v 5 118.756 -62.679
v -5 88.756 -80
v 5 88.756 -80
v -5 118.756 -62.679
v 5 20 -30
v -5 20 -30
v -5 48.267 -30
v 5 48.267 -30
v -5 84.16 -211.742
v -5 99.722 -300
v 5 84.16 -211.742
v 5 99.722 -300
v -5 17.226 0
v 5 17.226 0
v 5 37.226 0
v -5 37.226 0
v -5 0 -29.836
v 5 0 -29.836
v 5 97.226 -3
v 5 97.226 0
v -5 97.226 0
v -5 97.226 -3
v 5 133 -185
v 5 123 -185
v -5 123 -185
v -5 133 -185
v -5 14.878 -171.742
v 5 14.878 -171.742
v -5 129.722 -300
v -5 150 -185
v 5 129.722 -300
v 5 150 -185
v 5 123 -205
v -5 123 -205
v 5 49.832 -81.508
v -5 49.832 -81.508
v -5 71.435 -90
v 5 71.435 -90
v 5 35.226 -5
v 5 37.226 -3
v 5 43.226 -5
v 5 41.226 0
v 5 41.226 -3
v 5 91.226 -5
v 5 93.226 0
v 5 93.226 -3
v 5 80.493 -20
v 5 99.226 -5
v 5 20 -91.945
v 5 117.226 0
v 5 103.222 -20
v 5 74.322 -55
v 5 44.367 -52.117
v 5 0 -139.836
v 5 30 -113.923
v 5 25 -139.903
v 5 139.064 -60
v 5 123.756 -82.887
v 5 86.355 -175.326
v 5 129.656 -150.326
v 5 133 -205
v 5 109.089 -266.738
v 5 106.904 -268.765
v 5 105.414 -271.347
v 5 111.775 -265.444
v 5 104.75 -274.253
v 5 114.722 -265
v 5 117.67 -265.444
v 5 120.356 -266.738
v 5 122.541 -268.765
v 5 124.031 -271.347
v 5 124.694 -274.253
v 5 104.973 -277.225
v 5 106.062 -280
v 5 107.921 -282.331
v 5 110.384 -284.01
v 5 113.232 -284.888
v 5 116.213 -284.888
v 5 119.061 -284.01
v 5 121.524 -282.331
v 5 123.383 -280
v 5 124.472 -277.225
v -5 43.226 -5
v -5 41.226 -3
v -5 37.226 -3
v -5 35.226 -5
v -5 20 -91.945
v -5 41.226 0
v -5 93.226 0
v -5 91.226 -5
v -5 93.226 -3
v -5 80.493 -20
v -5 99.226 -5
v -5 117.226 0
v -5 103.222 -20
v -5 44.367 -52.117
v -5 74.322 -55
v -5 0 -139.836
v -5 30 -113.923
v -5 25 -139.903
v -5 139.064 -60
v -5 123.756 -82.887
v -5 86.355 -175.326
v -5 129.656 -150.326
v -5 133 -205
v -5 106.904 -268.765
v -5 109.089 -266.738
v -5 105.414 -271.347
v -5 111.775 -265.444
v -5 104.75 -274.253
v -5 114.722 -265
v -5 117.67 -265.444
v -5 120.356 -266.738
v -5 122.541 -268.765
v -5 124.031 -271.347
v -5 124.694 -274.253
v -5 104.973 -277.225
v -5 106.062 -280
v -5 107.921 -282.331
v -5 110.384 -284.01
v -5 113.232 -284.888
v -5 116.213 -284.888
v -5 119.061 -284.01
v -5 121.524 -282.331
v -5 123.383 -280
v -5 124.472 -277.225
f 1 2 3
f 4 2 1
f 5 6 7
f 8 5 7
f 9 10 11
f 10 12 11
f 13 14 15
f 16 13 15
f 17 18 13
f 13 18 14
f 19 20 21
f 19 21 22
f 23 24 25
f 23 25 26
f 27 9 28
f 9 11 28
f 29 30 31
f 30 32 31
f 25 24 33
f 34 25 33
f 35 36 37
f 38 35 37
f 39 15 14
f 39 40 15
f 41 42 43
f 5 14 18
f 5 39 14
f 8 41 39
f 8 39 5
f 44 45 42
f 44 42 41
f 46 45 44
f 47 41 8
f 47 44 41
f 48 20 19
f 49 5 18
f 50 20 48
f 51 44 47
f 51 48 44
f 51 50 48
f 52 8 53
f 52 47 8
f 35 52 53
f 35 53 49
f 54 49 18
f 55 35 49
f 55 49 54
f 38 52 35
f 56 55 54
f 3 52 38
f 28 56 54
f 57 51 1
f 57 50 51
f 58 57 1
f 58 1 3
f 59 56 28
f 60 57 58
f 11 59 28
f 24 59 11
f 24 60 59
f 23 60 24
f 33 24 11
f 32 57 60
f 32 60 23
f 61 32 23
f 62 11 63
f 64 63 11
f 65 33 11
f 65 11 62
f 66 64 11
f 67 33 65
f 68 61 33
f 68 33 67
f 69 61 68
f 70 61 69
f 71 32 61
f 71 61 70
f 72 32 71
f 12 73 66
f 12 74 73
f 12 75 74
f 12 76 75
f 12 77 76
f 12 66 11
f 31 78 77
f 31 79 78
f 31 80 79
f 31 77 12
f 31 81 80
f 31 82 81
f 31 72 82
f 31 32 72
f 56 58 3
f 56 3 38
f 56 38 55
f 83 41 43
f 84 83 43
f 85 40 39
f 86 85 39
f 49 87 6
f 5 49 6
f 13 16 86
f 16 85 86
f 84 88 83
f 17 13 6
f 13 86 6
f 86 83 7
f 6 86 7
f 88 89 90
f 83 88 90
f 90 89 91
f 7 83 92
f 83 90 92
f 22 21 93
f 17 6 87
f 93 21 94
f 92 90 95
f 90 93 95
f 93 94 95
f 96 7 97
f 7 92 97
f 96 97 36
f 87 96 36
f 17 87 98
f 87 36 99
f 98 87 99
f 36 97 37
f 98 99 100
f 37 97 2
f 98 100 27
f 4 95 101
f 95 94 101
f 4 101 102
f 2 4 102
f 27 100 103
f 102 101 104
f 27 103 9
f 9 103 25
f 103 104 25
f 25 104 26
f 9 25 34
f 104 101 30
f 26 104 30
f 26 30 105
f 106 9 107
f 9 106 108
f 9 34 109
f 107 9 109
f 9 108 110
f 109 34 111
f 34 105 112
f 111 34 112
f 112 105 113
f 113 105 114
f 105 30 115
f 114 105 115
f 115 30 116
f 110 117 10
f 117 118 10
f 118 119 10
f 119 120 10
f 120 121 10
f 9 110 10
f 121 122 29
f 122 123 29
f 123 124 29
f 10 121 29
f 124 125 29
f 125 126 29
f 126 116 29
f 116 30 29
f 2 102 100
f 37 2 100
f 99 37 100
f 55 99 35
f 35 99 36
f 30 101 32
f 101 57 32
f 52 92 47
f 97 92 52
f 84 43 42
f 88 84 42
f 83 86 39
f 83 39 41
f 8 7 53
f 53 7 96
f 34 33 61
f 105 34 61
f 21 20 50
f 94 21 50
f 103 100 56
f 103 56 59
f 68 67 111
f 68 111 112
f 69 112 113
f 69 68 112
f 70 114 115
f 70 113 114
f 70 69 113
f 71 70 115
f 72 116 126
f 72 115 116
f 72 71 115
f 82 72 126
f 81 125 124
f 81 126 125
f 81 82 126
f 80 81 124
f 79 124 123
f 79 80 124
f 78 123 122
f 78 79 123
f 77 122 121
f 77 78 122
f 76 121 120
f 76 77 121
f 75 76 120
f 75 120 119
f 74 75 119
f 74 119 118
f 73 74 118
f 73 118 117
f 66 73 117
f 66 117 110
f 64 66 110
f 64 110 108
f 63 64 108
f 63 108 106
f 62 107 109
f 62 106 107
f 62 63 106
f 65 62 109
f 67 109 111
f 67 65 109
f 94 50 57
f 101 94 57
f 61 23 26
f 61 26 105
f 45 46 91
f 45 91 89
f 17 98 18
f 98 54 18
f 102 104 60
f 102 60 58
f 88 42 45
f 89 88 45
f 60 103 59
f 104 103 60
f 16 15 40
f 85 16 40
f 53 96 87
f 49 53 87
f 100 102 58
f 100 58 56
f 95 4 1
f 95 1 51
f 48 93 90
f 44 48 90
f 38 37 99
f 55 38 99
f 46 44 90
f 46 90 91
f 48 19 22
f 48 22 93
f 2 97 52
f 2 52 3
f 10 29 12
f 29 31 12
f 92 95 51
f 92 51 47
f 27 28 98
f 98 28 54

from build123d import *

# Parameters (mm, degrees)
ESQUISSE1_W                  = 300
ESQUISSE1_H                  = 150
BOSS_EXTRU_1_DEPTH           = 5
ESQUISSE2_OUTSIDE_W          = 369.112
ESQUISSE2_OUTSIDE_H          = 219.112
ENL_V_MAT_EXTRU_1_DEPTH      = 5
ENL_V_MAT_EXTRU_2_DEPTH      = 336.559234711
ENL_V_MAT_EXTRU_2_DEPTH_BACK = 336.559234711
ENL_V_MAT_EXTRU_3_DEPTH      = 336.559234711
ENL_V_MAT_EXTRU_3_DEPTH_BACK = 336.559234711
ENL_V_MAT_EXTRU_4_DEPTH      = 336.559234711
ENL_V_MAT_EXTRU_4_DEPTH_BACK = 336.559234711
ESQUISSE5_R                  = 10
ESQUISSE6_W                  = 20
ESQUISSE6_H                  = 10
ENL_V_MAT_EXTRU_5_DEPTH      = 49


with BuildPart() as part:
    # Esquisse1 → Boss.-Extru.1 (new, symmetric)
    with BuildSketch(Plane(origin=(0, 0, 0), x_dir=(0, 0, -1), z_dir=(1, 0, 0))):
        with Locations((150, 75)):
            Rectangle(ESQUISSE1_W, ESQUISSE1_H)
    extrude(amount=BOSS_EXTRU_1_DEPTH, both=True)

    # Esquisse2 outside → Enlèv. mat.-Extru.1 (cut, symmetric)
    with BuildSketch(Plane(origin=(0, 0, 0), x_dir=(0, 0, -1), z_dir=(1, 0, 0))):
        with Locations((150, 75)):
            Rectangle(ESQUISSE2_OUTSIDE_W, ESQUISSE2_OUTSIDE_H)
        Polygon((0, 117.225703003), (60, 139.063917059), (185, 150), (300, 129.722397219), (300, 99.722397219), (211.741963761, 84.160124165), (171.741963761, 14.878091862), (139.835792798, 0), (29.835792798, 0), (0, 17.225703003), align=None, mode=Mode.SUBTRACT)
    extrude(amount=ENL_V_MAT_EXTRU_1_DEPTH, both=True, mode=Mode.SUBTRACT)

    # Esquisse3 → Enlèv. mat.-Extru.2 (cut, two sides: drawn at the far end of the back side and taken through both)
    with BuildSketch(Plane(origin=(5, 0, 0), x_dir=(0, 0, -1), z_dir=(1, 0, 0)).offset(-ENL_V_MAT_EXTRU_2_DEPTH_BACK)):
        Polygon((20, 103.221552239), (20, 80.493304508), (55, 74.321860183), (80, 88.755616913), (62.679491924, 118.755616913), align=None)
        Polygon((90, 71.435108837), (113.922571241, 30), (81.508057782, 49.831775443), align=None)
        Polygon((82.886751346, 123.755616913), (139.903333355, 25), (175.32640016, 86.354551467), (150.32640016, 129.655821657), align=None)
        Polygon((91.944969354, 20), (30, 20), (30, 48.267236345), (52.117107943, 44.367393479), align=None)
    extrude(amount=ENL_V_MAT_EXTRU_2_DEPTH + ENL_V_MAT_EXTRU_2_DEPTH_BACK, mode=Mode.SUBTRACT)

    # Esquisse4 → Enlèv. mat.-Extru.3 (cut, two sides: drawn at the far end of the back side and taken through both)
    with BuildSketch(Plane(origin=(5, 0, 0), x_dir=(0, 0, -1), z_dir=(1, 0, 0)).offset(-ENL_V_MAT_EXTRU_3_DEPTH_BACK)):
        Polygon((0, 97.225703003), (3, 97.225703003), (5, 99.225703003), (5, 91.225703003), (3, 93.225703003), (0, 93.225703003), align=None)
        Polygon((3, 41.225703003), (0, 41.225703003), (0, 37.225703003), (3, 37.225703003), (5, 35.225703003), (5, 43.225703003), align=None)
    extrude(amount=ENL_V_MAT_EXTRU_3_DEPTH + ENL_V_MAT_EXTRU_3_DEPTH_BACK, mode=Mode.SUBTRACT)

    # Esquisse5 → Enlèv. mat.-Extru.4 (cut, two sides: drawn at the far end of the back side and taken through both)
    with BuildSketch(Plane.ZY.offset(5).offset(-ENL_V_MAT_EXTRU_4_DEPTH_BACK)):
        with Locations((-275, 114.722397219)):
            Circle(ESQUISSE5_R)
    extrude(amount=ENL_V_MAT_EXTRU_4_DEPTH + ENL_V_MAT_EXTRU_4_DEPTH_BACK, mode=Mode.SUBTRACT)

    # Esquisse6 → Enlèv. mat.-Extru.5 (cut)
    with BuildSketch(Plane(origin=(5, 0, 0), x_dir=(0, 0, -1), z_dir=(1, 0, 0))):
        with Locations((195, 128)):
            Rectangle(ESQUISSE6_W, ESQUISSE6_H)
    extrude(amount=-ENL_V_MAT_EXTRU_5_DEPTH, mode=Mode.SUBTRACT)


solid = part.part
